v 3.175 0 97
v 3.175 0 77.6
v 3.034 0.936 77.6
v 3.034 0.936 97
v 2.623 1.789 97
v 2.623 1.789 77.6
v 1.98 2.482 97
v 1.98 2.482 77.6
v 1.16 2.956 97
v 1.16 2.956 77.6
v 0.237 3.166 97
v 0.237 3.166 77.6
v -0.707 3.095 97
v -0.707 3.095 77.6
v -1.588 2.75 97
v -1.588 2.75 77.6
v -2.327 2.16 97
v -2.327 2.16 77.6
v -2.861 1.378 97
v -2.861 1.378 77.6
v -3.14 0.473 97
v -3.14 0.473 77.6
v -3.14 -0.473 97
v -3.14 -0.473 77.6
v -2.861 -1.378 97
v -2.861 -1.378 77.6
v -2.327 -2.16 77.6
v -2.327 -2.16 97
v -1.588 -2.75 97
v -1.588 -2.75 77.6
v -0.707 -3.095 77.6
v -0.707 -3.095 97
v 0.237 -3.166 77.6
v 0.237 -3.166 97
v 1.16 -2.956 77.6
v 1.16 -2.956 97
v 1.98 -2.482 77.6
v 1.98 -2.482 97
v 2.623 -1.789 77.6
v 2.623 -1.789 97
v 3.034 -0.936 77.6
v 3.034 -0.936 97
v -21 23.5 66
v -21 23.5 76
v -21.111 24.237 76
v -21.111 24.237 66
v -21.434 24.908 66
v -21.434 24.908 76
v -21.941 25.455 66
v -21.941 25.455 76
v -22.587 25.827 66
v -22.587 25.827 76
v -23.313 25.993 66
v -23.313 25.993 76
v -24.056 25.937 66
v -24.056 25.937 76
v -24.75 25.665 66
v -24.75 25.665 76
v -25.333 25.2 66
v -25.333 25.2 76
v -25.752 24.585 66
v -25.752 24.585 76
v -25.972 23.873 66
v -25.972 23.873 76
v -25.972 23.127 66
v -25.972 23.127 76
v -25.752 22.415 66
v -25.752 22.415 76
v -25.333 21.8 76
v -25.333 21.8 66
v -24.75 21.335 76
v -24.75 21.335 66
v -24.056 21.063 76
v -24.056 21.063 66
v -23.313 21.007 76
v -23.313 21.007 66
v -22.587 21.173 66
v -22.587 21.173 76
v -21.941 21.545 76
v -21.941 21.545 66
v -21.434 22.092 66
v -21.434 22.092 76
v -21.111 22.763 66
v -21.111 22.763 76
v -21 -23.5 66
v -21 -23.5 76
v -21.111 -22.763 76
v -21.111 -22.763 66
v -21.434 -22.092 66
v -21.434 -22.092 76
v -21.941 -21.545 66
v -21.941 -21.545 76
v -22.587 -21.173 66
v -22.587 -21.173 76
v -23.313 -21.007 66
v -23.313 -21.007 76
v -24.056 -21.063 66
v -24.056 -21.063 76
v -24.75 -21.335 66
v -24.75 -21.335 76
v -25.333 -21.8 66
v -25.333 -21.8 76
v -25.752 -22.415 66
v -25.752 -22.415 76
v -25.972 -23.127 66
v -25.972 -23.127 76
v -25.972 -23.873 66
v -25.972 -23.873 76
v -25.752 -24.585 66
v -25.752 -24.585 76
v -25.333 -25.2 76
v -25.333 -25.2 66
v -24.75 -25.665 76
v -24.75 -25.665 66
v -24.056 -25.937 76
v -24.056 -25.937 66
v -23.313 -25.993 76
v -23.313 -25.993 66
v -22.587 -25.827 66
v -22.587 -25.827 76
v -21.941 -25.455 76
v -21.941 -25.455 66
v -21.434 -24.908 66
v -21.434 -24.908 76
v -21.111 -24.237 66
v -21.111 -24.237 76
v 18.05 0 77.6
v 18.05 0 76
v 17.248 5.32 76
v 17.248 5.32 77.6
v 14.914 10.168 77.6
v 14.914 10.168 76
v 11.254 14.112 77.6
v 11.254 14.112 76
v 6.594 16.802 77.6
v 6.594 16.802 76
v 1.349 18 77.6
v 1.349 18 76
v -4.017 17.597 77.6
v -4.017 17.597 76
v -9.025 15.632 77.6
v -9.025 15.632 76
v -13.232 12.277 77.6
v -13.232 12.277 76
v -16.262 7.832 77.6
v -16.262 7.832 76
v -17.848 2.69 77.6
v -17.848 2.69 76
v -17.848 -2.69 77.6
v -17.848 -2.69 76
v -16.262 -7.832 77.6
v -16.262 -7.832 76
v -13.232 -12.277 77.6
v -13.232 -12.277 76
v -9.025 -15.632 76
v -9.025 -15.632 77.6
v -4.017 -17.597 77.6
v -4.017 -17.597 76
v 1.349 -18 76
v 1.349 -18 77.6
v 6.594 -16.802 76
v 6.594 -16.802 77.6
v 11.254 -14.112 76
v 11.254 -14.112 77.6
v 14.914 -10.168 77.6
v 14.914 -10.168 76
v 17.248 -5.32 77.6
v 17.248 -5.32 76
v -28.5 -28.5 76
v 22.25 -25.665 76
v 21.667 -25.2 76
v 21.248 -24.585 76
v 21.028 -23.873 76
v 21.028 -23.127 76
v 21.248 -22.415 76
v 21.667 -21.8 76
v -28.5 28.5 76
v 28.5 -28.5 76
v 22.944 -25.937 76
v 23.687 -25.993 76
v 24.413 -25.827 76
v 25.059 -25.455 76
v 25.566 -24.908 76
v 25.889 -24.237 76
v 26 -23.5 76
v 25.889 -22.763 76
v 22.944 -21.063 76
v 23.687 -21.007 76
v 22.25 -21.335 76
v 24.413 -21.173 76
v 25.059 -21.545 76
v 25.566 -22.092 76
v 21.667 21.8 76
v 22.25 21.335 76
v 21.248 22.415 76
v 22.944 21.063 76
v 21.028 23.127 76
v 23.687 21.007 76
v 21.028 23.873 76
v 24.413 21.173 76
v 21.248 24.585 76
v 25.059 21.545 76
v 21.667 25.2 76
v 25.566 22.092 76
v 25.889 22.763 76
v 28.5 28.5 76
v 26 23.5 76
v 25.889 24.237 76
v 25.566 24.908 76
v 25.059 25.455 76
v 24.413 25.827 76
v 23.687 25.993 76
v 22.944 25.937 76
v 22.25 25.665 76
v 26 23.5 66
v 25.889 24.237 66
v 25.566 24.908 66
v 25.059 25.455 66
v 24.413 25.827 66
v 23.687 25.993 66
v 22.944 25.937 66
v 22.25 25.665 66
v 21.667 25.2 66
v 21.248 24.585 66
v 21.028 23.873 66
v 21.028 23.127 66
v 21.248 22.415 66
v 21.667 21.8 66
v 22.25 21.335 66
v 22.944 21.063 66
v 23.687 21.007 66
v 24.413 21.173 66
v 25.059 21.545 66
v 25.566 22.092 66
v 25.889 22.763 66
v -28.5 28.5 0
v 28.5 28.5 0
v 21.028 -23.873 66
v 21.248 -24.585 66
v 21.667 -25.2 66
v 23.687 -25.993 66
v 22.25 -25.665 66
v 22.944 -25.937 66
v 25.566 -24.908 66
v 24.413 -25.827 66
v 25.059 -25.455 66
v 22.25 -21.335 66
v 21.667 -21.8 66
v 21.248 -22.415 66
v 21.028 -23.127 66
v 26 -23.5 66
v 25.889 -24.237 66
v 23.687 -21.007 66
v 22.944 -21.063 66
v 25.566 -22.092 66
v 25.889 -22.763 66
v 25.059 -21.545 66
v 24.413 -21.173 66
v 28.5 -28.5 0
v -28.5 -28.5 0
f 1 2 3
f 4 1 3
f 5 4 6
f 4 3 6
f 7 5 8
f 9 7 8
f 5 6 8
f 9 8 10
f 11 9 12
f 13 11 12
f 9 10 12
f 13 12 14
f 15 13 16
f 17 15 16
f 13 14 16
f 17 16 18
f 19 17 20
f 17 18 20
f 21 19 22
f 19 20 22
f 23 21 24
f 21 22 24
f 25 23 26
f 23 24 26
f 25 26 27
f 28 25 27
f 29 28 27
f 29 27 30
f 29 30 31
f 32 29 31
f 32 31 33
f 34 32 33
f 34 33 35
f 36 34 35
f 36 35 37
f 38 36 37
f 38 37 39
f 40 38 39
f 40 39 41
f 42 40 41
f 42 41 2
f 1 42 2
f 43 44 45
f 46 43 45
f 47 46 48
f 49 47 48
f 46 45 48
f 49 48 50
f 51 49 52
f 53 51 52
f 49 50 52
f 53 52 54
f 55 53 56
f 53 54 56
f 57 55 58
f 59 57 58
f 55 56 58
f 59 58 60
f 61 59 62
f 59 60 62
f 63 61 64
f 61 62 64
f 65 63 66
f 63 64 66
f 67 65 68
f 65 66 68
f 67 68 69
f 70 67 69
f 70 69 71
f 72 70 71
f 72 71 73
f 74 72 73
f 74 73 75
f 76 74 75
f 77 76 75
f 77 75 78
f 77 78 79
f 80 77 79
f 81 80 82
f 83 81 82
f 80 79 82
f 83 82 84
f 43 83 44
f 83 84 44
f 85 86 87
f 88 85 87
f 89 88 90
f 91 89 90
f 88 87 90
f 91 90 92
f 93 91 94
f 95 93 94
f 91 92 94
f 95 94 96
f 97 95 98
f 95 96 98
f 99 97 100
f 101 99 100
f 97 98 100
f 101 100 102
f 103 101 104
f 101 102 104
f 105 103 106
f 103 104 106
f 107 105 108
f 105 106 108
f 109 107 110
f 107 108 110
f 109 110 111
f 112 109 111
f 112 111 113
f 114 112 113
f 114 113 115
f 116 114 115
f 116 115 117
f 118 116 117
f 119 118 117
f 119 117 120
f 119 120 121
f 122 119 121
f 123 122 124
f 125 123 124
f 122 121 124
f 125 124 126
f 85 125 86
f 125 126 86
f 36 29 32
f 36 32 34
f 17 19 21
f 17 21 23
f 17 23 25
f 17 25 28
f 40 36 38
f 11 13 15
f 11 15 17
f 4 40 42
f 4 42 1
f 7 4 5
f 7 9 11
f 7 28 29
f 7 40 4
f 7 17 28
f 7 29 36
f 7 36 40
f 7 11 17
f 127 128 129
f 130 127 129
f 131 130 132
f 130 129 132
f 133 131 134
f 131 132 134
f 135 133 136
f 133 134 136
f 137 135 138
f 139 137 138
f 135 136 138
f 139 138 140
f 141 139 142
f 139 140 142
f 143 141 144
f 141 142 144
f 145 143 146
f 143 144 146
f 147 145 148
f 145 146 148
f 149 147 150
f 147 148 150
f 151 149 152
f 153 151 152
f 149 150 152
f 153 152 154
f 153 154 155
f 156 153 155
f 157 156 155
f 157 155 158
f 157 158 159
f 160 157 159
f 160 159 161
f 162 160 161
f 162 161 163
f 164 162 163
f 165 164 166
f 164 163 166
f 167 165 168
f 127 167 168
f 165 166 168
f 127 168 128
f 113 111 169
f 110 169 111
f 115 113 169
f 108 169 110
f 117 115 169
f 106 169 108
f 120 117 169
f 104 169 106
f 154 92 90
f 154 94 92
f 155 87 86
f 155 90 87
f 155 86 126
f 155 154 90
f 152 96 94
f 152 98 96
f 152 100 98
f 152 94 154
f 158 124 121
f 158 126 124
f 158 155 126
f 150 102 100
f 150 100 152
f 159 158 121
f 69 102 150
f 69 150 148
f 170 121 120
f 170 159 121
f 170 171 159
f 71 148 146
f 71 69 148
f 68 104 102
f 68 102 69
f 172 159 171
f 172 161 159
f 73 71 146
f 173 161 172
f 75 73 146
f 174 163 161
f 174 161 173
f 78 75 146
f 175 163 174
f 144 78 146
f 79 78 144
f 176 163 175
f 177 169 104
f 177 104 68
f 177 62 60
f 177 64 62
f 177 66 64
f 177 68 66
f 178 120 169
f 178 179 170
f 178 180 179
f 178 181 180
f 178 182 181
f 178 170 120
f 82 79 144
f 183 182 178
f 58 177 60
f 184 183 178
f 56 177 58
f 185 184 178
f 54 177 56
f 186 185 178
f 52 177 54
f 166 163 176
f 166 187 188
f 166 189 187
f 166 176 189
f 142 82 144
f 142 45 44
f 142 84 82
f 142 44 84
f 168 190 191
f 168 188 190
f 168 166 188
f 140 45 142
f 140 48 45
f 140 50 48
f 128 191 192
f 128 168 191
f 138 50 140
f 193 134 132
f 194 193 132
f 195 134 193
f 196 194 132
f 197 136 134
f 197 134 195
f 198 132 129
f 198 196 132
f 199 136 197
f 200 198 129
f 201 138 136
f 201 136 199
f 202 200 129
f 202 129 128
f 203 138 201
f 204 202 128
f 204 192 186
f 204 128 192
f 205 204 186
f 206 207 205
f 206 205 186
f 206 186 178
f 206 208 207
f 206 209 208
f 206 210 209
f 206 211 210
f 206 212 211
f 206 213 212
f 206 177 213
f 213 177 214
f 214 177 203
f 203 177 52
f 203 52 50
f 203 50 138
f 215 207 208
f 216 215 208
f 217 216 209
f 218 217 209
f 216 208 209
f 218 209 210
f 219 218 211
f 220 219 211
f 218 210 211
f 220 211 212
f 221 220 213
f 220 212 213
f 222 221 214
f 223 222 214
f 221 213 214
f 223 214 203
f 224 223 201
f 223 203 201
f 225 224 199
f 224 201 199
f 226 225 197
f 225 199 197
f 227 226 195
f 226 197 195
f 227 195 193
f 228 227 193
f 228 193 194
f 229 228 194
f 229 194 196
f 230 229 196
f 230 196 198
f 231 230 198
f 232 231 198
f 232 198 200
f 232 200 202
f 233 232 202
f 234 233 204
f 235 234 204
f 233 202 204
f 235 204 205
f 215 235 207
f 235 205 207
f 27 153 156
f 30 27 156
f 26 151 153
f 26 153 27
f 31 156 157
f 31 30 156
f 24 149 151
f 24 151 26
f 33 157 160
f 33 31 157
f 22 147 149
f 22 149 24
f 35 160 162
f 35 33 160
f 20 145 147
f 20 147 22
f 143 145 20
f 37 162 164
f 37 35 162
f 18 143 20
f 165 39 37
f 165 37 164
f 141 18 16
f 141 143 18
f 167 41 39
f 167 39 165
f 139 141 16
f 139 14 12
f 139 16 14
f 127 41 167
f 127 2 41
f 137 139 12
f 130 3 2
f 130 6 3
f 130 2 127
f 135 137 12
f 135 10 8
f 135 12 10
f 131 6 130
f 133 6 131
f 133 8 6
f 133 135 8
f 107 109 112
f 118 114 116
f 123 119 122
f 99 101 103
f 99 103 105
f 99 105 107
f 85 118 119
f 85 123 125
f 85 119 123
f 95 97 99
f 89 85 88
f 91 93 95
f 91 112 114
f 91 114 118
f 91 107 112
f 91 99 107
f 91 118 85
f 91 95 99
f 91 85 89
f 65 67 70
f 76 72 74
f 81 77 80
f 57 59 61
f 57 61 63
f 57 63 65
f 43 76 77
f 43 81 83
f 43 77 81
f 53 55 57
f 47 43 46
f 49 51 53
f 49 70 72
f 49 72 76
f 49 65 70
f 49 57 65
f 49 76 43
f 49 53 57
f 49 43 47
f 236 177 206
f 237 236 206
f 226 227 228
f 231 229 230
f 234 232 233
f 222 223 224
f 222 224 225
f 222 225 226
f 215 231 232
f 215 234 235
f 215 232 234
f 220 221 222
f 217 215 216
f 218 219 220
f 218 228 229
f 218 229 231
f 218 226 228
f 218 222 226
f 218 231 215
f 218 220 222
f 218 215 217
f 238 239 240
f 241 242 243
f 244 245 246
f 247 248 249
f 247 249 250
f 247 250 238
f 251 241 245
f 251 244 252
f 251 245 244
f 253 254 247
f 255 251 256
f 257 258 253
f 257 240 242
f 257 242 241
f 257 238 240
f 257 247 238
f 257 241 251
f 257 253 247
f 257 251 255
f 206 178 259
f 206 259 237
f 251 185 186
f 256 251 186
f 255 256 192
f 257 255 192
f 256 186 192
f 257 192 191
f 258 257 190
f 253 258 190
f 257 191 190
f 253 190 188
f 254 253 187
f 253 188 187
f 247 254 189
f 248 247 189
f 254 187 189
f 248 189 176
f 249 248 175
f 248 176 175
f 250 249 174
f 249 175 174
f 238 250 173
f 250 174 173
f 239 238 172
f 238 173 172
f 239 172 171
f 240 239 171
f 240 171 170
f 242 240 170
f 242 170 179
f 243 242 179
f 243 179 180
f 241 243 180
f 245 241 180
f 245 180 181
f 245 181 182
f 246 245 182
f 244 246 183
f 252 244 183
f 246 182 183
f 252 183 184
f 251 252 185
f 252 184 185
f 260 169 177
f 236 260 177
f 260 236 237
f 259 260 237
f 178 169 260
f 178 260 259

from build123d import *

# Parameters (mm, degrees)
F0_W     = 57
F0_H     = 57
F1_DEPTH = 76
F2_R     = 18.05
F2_R_2   = 3.175
F3_DEPTH = 1.6
F4_DEPTH = 21
F5_R     = 2.5
F6_DEPTH = 10


with BuildPart() as f1:
    # F0 (on Top) → F1 (new body)
    with BuildSketch(Plane.XY):
        Rectangle(F0_W, F0_H)
    extrude(amount=F1_DEPTH)

    # F2 (on face) → F3 (join)
    with BuildSketch(Plane.XY.offset(76)):
        Circle(F2_R)
        Circle(F2_R_2, mode=Mode.SUBTRACT)
    extrude(amount=F3_DEPTH)

    # F2 (on face) → F4 (join)
    with BuildSketch(Plane.XY.offset(76)):
        Circle(F2_R_2)
    extrude(amount=F4_DEPTH)

    # F5 (on face) → F6 (cut)
    with BuildSketch(Plane.XY.offset(76)):
        with Locations((-23.5, 23.5)):
            Circle(F5_R)
        with Locations((23.5, 23.5)):
            Circle(F5_R)
        with Locations((23.5, -23.5)):
            Circle(F5_R)
        with Locations((-23.5, -23.5)):
            Circle(F5_R)
    extrude(amount=-F6_DEPTH, mode=Mode.SUBTRACT)


solid = f1.part
